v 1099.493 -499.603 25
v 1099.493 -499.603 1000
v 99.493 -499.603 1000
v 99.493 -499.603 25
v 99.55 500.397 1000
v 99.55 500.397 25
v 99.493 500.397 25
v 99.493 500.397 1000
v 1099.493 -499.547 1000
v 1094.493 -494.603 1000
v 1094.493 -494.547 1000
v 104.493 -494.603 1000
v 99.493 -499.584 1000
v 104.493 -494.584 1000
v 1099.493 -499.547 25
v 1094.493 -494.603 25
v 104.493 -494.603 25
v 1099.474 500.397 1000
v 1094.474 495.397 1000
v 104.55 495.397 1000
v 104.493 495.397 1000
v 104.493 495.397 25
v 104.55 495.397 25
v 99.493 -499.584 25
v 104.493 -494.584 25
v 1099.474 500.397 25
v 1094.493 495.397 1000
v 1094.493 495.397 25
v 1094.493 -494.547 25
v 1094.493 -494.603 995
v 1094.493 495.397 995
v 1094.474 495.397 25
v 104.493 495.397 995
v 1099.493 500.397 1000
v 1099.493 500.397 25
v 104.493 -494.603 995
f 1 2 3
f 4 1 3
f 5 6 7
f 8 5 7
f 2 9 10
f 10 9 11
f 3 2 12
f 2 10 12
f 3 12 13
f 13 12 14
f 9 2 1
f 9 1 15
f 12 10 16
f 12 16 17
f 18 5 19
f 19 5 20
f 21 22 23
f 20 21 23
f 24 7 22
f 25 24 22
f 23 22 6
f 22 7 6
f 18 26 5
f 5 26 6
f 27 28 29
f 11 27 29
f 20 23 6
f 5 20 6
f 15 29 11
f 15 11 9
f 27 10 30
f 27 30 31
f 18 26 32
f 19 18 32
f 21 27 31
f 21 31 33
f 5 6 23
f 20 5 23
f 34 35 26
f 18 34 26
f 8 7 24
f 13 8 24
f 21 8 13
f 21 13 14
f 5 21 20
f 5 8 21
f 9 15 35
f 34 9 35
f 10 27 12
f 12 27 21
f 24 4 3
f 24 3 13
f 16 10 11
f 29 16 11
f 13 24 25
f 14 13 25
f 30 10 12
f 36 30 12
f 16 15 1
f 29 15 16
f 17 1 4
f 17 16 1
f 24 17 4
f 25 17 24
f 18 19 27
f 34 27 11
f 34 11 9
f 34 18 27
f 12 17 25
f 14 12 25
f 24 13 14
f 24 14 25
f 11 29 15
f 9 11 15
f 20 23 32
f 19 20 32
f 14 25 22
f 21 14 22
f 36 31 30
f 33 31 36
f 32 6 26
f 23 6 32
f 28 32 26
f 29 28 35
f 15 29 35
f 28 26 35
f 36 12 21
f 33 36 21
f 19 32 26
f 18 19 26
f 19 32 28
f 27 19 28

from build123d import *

# Parameters (mm, degrees)
SKETCH3_W           = 1000
SKETCH3_H           = 1000
SKETCH3_W_2         = 990
SKETCH3_H_2         = 990
EXTRUDE_THIN1_DEPTH = 975
SKETCH4_W           = 990
SKETCH4_H           = 990
BOSS_EXTRUDE1_DEPTH = 5
SPLIT2_START        = 25
SPLIT2_DEPTH        = 975
SPLIT2_START_2      = -282.90665875
SPLIT2_2_OUTLINE_W  = 708.611311157
SPLIT2_2_OUTLINE_H  = 978
SPLIT2_2_DEPTH      = 1414.199703204
SPLIT2_START_3      = 424.226289007
SPLIT2_3_OUTLINE_W  = 708.388688843
SPLIT2_3_OUTLINE_H  = 978
SPLIT2_3_DEPTH      = 707.066755447
SPLIT2_4_DEPTH      = 975
SPLIT2_5_DEPTH      = 975


# Read off the part's stored shape, not the designer's step: Split2
with BuildPart() as part:
    # Sketch3 → Extrude-Thin1 (new body)
    with BuildSketch(Plane(origin=(0, 0, 1000), x_dir=(-1, 0, 0), z_dir=(0, 0, -1))):
        with Locations((-599.493213862, 0.396752623)):
            Rectangle(SKETCH3_W, SKETCH3_H)
        with Locations((-599.493213862, 0.396752623)):
            Rectangle(SKETCH3_W_2, SKETCH3_H_2, mode=Mode.SUBTRACT)
    extrude(amount=EXTRUDE_THIN1_DEPTH)

    # Split2 2 outline → Split2 2 (cut)
    with BuildSketch(Plane(origin=(0, 0, 0), x_dir=(0.7071067811865471, -0.707106781186548, 0), z_dir=(0.707106781186548, 0.707106781186547, 0)).offset(SPLIT2_START_2)):
        with Locations((69.305655579, -513)):
            Rectangle(SPLIT2_2_OUTLINE_W, SPLIT2_2_OUTLINE_H)
    extrude(amount=SPLIT2_2_DEPTH, mode=Mode.SUBTRACT)

    # Split2 3 outline → Split2 3 (cut)
    with BuildSketch(Plane(origin=(0, 0, 0), x_dir=(0.7071067811865471, -0.707106781186548, 0), z_dir=(0.707106781186548, 0.707106781186547, 0)).offset(SPLIT2_START_3)):
        with Locations((777.805655579, -513)):
            Rectangle(SPLIT2_3_OUTLINE_W, SPLIT2_3_OUTLINE_H)
    extrude(amount=SPLIT2_3_DEPTH, mode=Mode.SUBTRACT)


with BuildPart() as body_2:
    # Sketch4 → Boss-Extrude1 (new body)
    with BuildSketch(Plane(origin=(0, 0, 1000), x_dir=(-1, 0, 0), z_dir=(0, 0, -1))):
        with Locations((-599.493213862, 0.396752623)):
            Rectangle(SKETCH4_W, SKETCH4_H)
    extrude(amount=BOSS_EXTRUDE1_DEPTH)


with BuildPart() as body_3:
    # Split2 outline → Split2 (new body)
    with BuildSketch(Plane.XY.offset(SPLIT2_START)):
        Polygon((104.549818806, 495.396752623), (1094.473614036, 495.396752623), (1099.473614036, 500.396752623), (99.549818806, 500.396752623), align=None)
    extrude(amount=SPLIT2_DEPTH)


with BuildPart() as body_4:
    # Split2 4 outline → Split2 4 (new body)
    with BuildSketch(Plane.XY.offset(SPLIT2_START)):
        Polygon((1099.473614036, 500.396752623), (1094.473614036, 495.396752623), (1094.493213862, 495.396752623), (1094.493213862, -494.546642432), (1099.493213862, -499.546642432), (1099.493213862, 500.396752623), align=None)
    extrude(amount=SPLIT2_4_DEPTH)


with BuildPart() as body_5:
    # Split2 5 outline → Split2 5 (new body)
    with BuildSketch(Plane.XY.offset(SPLIT2_START)):
        Polygon((104.549818806, 495.396752623), (99.549818806, 500.396752623), (99.493213862, 500.396752623), (99.493213862, -499.583647551), (104.493213862, -494.583647551), (104.493213862, 495.396752623), align=None)
    extrude(amount=SPLIT2_5_DEPTH)


solid = Compound([part.part, body_2.part, body_3.part, body_4.part, body_5.part])
